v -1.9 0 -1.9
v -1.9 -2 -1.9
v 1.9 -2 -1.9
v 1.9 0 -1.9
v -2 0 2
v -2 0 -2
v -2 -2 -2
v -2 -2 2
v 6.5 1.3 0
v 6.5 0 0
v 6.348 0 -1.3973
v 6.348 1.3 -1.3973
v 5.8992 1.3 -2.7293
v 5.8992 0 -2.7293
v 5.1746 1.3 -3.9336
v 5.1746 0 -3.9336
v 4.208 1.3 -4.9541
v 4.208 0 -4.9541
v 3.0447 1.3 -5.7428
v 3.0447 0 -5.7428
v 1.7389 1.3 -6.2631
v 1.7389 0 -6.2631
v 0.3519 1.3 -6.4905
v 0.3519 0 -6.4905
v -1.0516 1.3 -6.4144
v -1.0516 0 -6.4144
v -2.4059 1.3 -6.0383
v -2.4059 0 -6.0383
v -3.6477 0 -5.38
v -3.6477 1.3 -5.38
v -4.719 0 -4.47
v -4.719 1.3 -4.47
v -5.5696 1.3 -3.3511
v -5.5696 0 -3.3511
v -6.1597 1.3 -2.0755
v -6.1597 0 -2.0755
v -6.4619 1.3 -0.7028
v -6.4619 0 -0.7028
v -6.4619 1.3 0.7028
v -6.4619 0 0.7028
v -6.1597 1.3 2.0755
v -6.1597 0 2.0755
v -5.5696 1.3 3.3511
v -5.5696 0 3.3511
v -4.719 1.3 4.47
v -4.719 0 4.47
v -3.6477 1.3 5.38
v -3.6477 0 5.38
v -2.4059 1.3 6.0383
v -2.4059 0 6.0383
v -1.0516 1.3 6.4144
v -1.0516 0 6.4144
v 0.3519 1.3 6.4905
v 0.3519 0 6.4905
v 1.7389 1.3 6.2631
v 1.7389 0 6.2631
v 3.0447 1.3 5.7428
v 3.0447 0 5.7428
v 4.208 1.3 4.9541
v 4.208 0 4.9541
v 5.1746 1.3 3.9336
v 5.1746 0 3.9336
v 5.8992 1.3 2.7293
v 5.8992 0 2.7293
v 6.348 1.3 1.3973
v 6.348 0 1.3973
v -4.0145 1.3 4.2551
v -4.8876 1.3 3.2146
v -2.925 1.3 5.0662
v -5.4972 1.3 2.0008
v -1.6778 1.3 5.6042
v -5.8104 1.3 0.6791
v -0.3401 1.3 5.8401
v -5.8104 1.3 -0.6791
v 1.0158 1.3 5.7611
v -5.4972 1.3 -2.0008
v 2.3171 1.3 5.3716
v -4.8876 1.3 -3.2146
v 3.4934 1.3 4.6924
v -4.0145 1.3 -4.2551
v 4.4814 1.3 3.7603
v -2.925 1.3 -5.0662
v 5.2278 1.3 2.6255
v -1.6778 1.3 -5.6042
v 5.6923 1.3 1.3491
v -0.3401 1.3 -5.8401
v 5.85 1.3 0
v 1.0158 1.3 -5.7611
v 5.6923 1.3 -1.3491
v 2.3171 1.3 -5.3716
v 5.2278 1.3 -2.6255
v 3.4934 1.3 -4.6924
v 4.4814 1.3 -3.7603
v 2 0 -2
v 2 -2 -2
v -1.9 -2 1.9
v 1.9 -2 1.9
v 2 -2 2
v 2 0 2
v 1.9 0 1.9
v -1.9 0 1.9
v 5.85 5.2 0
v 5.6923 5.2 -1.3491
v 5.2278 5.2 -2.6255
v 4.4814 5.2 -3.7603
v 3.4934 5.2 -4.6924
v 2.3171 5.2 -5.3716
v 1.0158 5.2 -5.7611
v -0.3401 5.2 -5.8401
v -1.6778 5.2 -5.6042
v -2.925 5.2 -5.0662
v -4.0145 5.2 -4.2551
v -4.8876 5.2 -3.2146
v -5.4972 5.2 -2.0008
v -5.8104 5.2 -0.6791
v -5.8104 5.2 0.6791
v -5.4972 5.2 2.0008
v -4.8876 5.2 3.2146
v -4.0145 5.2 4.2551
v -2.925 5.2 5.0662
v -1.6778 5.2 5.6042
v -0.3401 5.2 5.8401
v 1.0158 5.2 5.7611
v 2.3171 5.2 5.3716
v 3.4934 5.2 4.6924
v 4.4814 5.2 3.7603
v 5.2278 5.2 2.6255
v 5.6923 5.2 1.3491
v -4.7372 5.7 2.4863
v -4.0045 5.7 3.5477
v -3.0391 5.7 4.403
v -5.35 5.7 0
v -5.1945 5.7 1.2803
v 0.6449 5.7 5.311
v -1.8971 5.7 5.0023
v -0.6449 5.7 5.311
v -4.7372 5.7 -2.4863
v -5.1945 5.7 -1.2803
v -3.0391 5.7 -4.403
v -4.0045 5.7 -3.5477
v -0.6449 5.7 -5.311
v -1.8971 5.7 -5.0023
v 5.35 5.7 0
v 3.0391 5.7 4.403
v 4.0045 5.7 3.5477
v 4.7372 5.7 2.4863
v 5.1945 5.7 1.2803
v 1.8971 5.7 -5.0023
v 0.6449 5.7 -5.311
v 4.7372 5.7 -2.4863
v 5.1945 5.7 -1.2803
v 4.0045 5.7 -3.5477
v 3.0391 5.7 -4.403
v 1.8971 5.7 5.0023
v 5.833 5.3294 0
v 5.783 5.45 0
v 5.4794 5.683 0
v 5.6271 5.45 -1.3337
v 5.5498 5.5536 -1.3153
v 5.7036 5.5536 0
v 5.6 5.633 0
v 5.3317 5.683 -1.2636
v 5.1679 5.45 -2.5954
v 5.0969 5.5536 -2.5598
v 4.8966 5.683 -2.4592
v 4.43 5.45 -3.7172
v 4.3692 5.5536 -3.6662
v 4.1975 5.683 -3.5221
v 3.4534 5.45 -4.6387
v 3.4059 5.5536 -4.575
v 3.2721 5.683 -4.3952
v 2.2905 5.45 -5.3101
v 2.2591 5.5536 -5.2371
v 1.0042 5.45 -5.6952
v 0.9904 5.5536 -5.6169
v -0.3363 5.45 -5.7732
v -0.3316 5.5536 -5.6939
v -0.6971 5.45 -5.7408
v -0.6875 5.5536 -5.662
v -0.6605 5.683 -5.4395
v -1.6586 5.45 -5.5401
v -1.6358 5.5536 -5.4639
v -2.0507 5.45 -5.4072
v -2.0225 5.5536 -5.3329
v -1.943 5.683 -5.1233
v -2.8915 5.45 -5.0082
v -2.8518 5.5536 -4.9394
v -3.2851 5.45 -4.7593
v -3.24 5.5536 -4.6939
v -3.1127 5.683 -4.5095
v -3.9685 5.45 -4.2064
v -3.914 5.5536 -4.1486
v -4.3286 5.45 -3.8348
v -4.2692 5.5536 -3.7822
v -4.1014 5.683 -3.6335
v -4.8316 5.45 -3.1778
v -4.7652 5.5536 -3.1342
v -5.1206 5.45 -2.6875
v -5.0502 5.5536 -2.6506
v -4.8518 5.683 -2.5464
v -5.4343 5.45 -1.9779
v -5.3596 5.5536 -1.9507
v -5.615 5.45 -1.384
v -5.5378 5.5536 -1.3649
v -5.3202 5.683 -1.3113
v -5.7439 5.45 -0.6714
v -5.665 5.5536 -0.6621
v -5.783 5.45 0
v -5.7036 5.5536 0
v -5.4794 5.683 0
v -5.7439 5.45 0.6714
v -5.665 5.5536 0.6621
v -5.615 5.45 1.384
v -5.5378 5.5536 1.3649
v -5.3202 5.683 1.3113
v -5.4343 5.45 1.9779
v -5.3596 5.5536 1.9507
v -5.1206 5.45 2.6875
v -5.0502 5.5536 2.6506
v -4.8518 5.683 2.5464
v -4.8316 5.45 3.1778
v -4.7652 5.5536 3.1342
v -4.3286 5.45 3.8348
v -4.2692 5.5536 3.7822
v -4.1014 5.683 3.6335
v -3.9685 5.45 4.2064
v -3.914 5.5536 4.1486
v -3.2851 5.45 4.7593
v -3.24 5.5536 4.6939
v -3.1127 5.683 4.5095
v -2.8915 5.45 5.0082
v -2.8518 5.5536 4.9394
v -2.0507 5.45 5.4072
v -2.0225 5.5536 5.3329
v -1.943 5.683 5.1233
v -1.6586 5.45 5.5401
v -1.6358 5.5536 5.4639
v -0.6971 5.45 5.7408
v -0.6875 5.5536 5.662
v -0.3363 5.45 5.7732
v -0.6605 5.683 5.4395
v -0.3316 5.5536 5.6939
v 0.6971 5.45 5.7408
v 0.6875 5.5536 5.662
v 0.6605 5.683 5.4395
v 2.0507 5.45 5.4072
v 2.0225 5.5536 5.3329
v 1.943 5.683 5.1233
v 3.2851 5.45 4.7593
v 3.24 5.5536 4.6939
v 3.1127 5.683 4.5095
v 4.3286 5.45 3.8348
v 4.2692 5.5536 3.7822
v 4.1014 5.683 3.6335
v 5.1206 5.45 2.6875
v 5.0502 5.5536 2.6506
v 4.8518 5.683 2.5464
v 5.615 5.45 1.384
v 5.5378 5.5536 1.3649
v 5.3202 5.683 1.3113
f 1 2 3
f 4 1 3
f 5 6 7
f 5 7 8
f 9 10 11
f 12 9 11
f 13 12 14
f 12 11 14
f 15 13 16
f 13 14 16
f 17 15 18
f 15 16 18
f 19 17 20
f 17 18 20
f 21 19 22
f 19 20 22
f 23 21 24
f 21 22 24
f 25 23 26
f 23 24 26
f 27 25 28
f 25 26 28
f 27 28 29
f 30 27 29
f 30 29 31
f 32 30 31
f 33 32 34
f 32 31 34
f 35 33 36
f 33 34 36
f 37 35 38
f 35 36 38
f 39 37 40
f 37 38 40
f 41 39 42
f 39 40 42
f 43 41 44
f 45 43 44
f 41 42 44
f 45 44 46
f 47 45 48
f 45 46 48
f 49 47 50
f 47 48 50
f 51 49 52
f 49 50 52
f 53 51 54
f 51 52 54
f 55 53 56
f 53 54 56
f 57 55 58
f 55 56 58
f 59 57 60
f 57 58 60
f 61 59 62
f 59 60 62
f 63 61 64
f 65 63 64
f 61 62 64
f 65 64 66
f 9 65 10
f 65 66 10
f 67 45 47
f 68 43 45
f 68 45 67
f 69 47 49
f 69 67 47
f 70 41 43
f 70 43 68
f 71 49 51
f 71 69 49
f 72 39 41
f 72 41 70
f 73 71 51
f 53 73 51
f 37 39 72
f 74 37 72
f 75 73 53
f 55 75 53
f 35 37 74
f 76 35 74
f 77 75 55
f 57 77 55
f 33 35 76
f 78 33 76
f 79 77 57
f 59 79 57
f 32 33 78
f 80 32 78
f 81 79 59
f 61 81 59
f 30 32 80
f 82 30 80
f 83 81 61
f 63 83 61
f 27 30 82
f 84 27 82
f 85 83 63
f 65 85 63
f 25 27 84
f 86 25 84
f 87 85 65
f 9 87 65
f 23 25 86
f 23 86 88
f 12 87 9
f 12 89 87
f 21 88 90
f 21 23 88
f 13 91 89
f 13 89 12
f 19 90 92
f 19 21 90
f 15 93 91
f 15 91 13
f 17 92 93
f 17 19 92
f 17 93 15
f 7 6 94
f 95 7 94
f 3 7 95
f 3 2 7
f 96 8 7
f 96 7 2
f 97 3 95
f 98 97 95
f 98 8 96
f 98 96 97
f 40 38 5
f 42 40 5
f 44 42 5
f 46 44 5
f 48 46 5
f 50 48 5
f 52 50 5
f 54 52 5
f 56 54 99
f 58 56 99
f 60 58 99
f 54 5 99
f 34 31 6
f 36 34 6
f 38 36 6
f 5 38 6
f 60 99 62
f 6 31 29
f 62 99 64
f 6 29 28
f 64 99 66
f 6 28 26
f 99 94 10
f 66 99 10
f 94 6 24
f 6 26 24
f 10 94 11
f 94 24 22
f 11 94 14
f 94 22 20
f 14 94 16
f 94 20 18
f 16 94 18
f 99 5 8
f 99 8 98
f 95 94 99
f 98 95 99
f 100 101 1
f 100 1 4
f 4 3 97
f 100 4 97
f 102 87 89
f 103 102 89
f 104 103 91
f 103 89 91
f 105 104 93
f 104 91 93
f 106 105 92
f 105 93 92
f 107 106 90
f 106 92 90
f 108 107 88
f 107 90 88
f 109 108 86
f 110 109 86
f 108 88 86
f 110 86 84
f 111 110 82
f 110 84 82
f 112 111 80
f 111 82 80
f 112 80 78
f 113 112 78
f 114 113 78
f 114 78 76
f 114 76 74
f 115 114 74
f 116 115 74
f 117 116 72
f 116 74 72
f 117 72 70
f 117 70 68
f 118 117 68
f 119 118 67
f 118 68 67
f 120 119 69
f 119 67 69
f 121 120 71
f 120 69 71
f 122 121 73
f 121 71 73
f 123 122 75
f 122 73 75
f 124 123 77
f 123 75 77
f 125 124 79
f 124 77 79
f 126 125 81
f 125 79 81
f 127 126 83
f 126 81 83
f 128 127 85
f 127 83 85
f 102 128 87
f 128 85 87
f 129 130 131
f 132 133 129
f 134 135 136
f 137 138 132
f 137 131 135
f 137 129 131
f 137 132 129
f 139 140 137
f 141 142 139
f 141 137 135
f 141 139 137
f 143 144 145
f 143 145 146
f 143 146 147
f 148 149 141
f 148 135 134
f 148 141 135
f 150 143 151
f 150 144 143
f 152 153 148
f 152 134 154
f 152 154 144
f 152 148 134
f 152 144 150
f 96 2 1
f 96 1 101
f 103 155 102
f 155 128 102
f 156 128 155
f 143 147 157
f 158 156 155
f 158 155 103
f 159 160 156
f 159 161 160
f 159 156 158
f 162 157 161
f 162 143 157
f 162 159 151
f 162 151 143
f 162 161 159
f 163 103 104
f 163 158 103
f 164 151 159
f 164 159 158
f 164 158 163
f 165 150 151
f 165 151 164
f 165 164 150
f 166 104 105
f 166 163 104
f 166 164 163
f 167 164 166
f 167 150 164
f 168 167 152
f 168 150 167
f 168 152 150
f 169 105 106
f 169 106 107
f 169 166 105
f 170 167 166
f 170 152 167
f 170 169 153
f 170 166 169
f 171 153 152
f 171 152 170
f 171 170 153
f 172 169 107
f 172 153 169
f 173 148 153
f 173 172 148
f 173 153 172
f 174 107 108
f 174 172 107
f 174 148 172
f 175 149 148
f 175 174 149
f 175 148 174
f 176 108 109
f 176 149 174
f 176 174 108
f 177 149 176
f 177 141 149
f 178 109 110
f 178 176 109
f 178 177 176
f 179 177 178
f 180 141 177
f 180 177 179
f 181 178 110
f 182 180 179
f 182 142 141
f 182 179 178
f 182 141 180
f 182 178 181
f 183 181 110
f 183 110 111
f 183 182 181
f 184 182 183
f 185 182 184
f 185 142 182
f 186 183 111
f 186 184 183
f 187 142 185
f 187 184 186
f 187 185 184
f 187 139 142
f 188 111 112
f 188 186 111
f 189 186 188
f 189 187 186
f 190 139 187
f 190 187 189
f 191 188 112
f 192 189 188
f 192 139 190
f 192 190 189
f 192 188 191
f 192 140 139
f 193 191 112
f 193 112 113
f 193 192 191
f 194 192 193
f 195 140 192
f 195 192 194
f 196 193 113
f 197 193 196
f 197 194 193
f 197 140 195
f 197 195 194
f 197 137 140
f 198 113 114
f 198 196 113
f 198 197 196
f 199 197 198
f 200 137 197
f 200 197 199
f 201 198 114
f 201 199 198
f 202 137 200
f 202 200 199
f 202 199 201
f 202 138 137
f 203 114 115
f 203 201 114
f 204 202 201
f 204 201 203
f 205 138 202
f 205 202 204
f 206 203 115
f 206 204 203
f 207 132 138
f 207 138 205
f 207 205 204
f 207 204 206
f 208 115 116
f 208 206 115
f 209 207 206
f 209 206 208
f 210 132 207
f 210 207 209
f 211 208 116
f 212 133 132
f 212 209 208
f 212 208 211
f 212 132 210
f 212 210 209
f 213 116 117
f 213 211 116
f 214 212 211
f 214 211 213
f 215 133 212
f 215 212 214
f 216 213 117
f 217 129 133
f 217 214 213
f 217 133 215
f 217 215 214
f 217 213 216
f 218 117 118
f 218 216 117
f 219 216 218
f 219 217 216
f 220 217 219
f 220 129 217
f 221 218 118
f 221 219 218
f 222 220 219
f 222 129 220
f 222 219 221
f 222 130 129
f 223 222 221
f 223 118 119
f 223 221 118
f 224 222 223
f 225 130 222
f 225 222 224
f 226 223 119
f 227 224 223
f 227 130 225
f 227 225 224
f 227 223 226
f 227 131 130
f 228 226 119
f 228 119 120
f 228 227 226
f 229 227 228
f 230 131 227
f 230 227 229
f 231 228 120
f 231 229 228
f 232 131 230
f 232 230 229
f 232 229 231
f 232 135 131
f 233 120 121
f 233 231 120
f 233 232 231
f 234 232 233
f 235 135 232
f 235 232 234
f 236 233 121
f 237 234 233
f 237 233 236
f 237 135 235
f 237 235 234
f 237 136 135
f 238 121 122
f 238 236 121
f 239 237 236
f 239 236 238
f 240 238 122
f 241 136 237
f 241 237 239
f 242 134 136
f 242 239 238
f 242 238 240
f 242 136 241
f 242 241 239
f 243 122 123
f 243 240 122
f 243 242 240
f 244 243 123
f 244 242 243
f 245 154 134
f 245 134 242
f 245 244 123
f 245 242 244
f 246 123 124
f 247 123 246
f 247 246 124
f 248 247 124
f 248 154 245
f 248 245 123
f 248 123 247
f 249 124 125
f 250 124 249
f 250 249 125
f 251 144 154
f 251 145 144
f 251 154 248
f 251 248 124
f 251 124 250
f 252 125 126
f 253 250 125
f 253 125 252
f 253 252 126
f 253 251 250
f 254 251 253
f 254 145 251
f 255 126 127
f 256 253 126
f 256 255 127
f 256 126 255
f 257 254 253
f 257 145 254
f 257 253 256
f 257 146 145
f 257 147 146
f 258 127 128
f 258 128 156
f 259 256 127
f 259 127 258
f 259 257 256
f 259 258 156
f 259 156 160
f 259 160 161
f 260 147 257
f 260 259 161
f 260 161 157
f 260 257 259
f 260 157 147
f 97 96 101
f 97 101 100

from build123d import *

# Parameters (mm, degrees)
SKETCH_5_R          = 6.5
EXTRUDE_5_DEPTH     = 1.3
SKETCH_6_R          = 5.85
EXTRUDE_6_DEPTH     = 4.4
FILLET_2_R          = 0.5
SKETCH_7_W          = 4
SKETCH_7_H          = 4
EXTRUDE_7_DEPTH     = 2
SKETCH_8_W          = 3.8
SKETCH_8_H          = 3.8
CUT_EXTRUDE_1_DEPTH = 2


with BuildPart() as part:
    # Эскиз5 → Бобышка-Вытянуть5 (new body)
    with BuildSketch(Plane(origin=(0, 0, 0), x_dir=(1, 0, 0), z_dir=(0, 1, 0))):
        Circle(SKETCH_5_R)
    extrude(amount=EXTRUDE_5_DEPTH)

    # Эскиз6 → Бобышка-Вытянуть6 (add)
    with BuildSketch(Plane(origin=(0, 1.3, 0), x_dir=(1, 0, 0), z_dir=(0, 1, 0))):
        Circle(SKETCH_6_R)
    extrude(amount=EXTRUDE_6_DEPTH)

    # Скругление2
    fillet_2_edges = [part.edges().sort_by_distance(p)[0] for p in [
        (-5.85, 5.7, 0),
    ]]
    fillet(fillet_2_edges, radius=FILLET_2_R)

    # Эскиз7 → Бобышка-Вытянуть7 (add)
    with BuildSketch(Plane.XZ):
        Rectangle(SKETCH_7_W, SKETCH_7_H)
    extrude(amount=EXTRUDE_7_DEPTH)

    # Эскиз8 → Вырез-Вытянуть1 (cut)
    with BuildSketch(Plane.XZ.offset(2)):
        Rectangle(SKETCH_8_W, SKETCH_8_H)
    extrude(amount=-CUT_EXTRUDE_1_DEPTH, mode=Mode.SUBTRACT)


solid = part.part
